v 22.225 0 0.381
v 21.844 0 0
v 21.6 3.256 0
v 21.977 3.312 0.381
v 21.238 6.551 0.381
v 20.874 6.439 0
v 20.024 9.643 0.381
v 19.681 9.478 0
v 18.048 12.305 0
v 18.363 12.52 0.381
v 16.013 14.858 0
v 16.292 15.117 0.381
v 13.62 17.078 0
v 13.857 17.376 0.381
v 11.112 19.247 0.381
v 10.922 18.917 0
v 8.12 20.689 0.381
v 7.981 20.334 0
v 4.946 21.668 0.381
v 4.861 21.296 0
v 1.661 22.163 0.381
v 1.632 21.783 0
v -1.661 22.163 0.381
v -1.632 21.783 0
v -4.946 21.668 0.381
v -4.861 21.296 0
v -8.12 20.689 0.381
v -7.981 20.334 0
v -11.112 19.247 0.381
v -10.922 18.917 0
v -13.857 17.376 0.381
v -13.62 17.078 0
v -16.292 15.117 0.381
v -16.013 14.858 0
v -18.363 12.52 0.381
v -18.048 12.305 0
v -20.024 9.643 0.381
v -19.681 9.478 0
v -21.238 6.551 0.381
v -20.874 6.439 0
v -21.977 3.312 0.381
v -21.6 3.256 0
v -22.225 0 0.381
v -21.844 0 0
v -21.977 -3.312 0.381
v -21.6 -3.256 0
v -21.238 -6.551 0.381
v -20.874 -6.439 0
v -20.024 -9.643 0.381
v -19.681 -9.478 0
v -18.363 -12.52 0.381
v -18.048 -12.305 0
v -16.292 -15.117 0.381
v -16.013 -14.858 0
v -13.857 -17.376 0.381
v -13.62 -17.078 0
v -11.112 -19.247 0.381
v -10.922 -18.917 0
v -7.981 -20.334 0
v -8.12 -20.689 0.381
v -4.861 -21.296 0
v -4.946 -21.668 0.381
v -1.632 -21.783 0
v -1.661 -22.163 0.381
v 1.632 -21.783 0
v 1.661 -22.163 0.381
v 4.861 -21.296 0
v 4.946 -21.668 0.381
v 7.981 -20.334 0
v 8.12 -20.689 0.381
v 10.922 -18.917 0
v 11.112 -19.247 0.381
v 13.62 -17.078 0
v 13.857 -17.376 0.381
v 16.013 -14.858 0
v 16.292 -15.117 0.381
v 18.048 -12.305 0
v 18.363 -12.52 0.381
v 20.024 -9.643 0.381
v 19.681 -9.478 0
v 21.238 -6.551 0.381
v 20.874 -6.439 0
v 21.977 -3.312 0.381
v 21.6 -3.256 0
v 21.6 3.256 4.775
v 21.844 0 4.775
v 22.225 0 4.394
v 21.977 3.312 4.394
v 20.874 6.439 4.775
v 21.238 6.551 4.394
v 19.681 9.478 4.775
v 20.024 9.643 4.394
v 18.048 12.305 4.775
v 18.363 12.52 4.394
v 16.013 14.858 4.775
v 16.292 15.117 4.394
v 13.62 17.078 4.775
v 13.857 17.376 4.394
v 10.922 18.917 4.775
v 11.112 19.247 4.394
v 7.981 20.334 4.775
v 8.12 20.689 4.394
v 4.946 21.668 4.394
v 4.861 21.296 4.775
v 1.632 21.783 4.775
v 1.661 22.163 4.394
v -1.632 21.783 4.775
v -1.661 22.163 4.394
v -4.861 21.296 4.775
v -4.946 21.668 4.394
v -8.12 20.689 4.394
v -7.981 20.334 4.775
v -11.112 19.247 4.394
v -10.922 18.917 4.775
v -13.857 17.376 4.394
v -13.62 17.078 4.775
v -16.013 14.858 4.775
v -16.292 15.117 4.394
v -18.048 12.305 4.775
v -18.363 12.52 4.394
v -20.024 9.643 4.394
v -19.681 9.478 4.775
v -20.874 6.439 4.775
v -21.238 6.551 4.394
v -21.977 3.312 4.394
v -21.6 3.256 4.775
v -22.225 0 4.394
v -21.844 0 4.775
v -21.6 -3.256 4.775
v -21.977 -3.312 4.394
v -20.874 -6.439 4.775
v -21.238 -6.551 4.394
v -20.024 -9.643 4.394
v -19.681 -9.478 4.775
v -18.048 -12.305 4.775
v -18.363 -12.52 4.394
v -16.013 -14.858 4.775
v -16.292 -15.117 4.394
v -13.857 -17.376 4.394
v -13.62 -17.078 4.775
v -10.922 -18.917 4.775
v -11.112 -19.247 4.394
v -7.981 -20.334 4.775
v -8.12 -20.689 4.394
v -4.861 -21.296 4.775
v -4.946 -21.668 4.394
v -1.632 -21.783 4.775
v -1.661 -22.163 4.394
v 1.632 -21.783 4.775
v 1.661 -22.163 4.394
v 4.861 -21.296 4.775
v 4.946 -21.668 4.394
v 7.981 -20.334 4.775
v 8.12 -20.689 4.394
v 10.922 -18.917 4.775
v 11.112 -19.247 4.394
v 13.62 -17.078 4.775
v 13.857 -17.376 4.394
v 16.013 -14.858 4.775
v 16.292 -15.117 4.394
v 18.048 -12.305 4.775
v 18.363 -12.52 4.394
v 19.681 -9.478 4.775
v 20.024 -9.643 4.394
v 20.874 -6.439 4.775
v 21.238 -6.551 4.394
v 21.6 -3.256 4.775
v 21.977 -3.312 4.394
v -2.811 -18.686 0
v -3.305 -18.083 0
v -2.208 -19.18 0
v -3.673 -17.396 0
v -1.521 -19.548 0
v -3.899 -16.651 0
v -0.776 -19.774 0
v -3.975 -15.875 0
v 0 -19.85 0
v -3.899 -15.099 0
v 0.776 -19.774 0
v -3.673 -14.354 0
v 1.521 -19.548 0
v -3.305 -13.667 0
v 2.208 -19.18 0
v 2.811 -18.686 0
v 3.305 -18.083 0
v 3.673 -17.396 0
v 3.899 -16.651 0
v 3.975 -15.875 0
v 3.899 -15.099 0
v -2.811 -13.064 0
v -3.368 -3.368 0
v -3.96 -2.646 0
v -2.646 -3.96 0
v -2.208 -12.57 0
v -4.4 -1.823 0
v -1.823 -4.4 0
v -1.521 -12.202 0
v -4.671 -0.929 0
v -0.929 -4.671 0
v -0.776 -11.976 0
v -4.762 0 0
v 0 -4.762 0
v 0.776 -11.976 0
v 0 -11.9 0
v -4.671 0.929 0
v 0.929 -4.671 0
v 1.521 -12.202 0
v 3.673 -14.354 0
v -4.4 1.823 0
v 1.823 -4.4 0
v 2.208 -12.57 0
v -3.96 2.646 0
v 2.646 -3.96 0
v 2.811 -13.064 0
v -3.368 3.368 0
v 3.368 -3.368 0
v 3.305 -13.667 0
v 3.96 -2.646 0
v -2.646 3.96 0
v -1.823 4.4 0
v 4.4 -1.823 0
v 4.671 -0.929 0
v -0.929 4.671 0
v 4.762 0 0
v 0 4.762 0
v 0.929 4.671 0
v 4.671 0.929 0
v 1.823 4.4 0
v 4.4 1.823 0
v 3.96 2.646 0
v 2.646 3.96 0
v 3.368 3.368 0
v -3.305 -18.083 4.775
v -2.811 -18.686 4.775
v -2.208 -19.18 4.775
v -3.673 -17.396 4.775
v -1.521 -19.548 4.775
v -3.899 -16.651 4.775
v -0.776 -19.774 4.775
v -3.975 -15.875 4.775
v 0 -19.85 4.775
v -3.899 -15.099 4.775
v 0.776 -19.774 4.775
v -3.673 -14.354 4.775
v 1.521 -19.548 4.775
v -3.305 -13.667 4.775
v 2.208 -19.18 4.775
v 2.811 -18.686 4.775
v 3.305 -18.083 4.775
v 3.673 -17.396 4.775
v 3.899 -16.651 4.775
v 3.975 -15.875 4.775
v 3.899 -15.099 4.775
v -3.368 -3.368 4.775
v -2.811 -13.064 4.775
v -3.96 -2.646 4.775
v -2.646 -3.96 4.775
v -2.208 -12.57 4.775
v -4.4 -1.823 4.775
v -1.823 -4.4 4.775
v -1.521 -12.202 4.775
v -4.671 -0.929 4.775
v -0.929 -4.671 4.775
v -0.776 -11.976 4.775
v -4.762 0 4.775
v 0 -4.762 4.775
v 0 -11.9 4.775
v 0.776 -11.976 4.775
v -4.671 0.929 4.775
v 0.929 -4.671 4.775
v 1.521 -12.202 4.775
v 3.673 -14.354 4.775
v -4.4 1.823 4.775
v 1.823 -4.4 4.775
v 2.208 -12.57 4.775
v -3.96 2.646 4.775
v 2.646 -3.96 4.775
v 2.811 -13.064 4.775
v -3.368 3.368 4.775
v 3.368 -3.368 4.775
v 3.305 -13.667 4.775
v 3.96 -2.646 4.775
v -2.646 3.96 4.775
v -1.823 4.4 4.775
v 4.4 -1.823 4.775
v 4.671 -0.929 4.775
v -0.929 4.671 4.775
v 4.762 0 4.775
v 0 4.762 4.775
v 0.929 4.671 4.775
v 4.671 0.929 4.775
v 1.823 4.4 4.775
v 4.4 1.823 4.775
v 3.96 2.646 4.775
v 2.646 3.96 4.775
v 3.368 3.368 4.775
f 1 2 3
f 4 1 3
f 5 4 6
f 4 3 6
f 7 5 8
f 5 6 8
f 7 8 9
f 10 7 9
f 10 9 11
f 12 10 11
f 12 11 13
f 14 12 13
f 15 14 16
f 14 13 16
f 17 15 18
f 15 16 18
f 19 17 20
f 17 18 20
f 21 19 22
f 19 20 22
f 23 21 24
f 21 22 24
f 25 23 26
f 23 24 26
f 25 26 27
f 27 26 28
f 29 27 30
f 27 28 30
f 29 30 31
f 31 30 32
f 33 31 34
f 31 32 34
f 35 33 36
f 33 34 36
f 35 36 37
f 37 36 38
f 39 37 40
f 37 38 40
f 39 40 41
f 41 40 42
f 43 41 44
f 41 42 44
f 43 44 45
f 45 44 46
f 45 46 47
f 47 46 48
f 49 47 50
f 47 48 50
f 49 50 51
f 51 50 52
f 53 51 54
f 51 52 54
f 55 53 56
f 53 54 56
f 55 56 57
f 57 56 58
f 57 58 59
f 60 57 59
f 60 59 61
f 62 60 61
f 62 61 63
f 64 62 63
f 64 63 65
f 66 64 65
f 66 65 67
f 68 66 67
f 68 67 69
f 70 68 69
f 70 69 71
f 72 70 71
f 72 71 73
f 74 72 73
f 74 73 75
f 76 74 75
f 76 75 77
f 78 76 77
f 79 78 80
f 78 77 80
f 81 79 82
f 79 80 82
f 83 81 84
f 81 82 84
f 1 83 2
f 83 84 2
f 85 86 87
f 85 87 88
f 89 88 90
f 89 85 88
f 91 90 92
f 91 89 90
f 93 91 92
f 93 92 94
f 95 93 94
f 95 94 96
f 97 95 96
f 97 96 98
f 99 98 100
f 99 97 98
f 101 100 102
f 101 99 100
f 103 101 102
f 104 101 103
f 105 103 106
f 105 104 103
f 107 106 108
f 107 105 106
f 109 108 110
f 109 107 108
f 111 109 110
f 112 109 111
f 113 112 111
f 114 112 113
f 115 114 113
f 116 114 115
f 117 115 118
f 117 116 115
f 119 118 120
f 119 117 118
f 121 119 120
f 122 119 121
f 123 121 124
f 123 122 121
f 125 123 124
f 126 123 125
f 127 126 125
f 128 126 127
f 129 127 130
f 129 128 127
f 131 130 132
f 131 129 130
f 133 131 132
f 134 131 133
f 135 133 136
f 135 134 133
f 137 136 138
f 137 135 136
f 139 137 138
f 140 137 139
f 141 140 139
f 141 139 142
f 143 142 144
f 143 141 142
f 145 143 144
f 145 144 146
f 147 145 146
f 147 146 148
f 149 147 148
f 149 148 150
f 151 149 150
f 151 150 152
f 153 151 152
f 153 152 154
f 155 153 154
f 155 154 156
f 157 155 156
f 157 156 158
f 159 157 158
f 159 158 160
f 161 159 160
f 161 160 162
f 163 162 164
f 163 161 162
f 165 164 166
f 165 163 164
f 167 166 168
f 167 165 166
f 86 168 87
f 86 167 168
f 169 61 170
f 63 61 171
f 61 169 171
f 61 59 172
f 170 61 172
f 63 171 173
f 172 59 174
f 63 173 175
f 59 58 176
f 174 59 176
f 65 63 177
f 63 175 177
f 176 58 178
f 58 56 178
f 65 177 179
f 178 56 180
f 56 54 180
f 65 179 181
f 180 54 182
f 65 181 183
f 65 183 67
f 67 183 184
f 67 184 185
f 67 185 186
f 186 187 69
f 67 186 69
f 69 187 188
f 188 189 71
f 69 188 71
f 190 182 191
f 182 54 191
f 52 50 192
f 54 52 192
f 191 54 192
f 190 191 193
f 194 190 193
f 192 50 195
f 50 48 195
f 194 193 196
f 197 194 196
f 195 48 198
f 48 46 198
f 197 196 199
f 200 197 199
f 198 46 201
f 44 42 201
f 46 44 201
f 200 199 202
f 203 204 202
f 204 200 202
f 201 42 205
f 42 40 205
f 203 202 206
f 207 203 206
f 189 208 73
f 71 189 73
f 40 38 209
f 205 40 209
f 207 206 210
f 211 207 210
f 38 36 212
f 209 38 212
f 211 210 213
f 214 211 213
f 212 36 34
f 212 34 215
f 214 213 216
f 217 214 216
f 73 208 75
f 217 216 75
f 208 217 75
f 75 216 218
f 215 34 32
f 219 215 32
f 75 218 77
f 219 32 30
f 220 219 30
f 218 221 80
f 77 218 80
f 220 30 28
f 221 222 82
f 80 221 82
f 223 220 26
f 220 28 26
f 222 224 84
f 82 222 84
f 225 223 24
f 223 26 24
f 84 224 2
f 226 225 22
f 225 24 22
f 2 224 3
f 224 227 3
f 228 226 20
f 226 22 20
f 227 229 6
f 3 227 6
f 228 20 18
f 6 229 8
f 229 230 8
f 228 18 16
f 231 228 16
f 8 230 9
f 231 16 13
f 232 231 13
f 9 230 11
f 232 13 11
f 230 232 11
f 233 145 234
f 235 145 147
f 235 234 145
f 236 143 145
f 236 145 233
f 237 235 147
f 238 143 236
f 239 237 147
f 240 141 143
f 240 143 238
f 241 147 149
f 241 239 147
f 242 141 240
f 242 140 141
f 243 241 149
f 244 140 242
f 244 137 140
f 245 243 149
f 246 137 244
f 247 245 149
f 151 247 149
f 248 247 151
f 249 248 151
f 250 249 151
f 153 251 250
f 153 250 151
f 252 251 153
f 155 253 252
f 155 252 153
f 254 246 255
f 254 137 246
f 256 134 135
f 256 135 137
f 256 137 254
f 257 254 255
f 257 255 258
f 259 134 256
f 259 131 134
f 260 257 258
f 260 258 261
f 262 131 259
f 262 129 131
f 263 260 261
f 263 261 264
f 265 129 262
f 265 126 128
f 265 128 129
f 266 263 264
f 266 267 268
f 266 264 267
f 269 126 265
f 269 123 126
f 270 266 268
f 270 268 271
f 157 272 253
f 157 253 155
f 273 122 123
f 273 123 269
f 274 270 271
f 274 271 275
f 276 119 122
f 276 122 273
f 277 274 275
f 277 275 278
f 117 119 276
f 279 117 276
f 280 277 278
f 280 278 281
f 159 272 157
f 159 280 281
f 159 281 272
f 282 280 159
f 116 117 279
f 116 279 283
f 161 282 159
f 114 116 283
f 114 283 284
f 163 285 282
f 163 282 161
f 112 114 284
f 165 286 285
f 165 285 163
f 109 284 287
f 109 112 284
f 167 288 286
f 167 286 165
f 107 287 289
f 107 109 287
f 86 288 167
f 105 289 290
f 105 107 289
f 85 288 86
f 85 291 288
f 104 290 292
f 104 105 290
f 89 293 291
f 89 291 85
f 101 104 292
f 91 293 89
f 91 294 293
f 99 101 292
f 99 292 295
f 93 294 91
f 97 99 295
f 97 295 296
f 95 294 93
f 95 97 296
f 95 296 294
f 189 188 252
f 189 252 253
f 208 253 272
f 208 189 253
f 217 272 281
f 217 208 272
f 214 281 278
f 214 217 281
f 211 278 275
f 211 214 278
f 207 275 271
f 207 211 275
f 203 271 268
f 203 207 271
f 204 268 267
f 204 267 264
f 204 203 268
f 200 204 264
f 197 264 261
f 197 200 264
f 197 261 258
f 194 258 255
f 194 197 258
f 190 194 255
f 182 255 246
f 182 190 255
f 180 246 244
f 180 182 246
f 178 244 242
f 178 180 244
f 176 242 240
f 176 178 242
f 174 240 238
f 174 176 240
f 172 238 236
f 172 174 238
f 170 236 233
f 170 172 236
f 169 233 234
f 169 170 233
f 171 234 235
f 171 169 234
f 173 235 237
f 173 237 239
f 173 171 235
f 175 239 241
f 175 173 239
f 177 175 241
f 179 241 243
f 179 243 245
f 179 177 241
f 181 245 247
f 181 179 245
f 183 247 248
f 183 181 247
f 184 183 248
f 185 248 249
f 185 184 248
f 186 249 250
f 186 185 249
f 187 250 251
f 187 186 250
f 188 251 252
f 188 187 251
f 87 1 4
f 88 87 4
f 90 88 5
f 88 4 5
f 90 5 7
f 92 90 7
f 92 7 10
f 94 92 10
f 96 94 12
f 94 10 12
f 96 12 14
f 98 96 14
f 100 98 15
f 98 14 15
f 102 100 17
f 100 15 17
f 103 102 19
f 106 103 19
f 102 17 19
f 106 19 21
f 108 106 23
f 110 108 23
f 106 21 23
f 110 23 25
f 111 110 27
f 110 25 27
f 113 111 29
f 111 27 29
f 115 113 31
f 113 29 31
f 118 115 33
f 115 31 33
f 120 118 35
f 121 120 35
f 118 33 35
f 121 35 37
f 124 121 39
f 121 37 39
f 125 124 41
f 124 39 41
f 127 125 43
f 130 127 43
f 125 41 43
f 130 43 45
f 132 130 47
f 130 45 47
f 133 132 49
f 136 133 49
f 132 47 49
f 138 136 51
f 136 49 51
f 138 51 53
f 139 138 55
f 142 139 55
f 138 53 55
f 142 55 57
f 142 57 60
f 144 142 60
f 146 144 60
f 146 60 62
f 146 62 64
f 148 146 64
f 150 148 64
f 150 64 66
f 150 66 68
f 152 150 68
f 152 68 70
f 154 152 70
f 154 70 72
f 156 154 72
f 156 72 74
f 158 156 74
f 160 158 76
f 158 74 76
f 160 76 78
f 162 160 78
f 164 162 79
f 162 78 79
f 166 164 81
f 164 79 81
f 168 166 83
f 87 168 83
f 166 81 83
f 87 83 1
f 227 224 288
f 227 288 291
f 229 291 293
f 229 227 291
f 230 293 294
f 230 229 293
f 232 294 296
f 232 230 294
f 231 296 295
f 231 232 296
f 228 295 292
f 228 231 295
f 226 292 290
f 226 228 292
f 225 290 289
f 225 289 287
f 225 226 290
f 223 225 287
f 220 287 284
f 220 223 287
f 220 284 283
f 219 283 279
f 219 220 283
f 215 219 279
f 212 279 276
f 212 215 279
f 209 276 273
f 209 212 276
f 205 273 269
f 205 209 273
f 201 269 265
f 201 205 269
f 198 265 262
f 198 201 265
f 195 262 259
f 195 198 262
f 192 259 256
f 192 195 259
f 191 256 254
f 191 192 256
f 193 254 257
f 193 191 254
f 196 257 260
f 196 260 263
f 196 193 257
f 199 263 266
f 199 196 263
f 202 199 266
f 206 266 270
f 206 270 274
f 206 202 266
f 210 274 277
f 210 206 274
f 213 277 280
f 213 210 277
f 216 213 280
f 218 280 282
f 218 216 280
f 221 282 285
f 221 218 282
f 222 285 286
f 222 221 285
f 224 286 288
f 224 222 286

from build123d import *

# Parameters (mm, degrees)
F0_R     = 22.225
F0_R_2   = 3.9751
F0_R_3   = 4.7625
F1_DEPTH = 4.7752
F2_SIZE  = 0.381


with BuildPart() as f1:
    # F0 (on Top) → F1 (new body)
    with BuildSketch(Plane.XY):
        Circle(F0_R)
        with Locations((0, -15.875)):
            Circle(F0_R_2, mode=Mode.SUBTRACT)
        Circle(F0_R_3, mode=Mode.SUBTRACT)
    extrude(amount=F1_DEPTH)

    # F2
    f2_edges = [f1.edges().sort_by_distance(p)[0] for p in [
        (-22.225, 0, 4.7752),
        (-22.225, 0, 0),
    ]]
    chamfer(f2_edges, length=F2_SIZE)


solid = f1.part
